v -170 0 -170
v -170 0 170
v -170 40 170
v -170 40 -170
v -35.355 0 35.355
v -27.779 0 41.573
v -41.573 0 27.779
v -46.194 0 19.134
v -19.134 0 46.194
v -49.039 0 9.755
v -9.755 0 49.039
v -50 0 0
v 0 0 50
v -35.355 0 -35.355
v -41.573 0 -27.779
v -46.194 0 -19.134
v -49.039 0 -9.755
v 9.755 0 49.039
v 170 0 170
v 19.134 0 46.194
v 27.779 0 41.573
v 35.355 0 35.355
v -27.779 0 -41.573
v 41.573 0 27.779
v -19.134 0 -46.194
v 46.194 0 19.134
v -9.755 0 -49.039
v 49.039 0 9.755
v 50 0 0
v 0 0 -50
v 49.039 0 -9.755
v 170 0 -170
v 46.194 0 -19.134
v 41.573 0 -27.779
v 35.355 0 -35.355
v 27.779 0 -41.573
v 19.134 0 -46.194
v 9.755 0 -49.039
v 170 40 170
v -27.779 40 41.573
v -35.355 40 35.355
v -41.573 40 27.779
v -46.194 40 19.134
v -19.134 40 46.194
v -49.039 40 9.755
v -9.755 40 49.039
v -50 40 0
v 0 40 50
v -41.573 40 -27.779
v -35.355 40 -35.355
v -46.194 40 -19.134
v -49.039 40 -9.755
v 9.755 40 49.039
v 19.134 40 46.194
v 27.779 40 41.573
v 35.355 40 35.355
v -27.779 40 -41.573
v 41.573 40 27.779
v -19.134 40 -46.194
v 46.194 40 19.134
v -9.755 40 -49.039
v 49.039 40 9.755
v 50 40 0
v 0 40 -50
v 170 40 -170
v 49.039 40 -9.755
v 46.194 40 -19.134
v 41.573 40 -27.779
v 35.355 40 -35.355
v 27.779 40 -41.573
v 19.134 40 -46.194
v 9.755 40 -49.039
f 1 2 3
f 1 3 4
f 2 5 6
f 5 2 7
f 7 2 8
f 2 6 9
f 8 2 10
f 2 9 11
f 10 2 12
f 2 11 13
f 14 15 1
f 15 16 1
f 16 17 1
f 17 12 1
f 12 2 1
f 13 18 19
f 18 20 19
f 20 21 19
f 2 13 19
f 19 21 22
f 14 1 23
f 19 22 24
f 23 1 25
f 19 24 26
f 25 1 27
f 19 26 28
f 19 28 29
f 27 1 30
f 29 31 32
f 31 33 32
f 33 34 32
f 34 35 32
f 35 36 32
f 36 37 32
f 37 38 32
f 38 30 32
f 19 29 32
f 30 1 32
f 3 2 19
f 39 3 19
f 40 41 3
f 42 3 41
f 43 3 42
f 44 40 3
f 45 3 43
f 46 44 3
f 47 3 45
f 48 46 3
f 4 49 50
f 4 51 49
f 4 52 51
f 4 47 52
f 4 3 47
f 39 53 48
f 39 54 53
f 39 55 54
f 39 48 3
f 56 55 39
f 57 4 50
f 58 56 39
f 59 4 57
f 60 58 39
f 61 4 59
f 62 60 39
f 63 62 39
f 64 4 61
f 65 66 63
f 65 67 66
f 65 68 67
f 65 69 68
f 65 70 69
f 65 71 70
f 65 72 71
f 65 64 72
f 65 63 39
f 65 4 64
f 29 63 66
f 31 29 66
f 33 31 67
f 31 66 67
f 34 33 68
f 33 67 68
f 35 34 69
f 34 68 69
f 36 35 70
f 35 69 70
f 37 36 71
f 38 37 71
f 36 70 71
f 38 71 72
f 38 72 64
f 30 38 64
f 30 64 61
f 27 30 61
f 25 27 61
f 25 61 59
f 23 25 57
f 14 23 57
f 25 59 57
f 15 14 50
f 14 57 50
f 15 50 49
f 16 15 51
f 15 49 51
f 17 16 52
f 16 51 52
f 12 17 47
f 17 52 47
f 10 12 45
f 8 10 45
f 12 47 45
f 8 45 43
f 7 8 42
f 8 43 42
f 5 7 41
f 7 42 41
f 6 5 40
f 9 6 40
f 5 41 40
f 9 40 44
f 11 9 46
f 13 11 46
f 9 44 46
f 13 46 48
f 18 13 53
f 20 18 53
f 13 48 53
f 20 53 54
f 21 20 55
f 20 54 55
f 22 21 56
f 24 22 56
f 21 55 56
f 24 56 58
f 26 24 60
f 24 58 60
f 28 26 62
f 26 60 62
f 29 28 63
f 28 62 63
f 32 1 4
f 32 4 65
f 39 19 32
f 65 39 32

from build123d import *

# Parameters (mm, degrees)
SKETCH1_W           = 340
SKETCH1_H           = 340
BOSS_EXTRUDE1_DEPTH = 40
SKETCH2_R           = 50
CUT_EXTRUDE1_DEPTH  = 40


with BuildPart() as part:
    # Sketch1 → Boss-Extrude1 (new body)
    with BuildSketch(Plane(origin=(0, 0, 0), x_dir=(1, 0, 0), z_dir=(0, 1, 0))):
        Rectangle(SKETCH1_W, SKETCH1_H)
    extrude(amount=BOSS_EXTRUDE1_DEPTH)

    # Sketch2 → Cut-Extrude1 (cut)
    with BuildSketch(Plane(origin=(0, 40, 0), x_dir=(1, 0, 0), z_dir=(0, 1, 0))):
        Circle(SKETCH2_R)
    extrude(amount=-CUT_EXTRUDE1_DEPTH, mode=Mode.SUBTRACT)


solid = part.part
